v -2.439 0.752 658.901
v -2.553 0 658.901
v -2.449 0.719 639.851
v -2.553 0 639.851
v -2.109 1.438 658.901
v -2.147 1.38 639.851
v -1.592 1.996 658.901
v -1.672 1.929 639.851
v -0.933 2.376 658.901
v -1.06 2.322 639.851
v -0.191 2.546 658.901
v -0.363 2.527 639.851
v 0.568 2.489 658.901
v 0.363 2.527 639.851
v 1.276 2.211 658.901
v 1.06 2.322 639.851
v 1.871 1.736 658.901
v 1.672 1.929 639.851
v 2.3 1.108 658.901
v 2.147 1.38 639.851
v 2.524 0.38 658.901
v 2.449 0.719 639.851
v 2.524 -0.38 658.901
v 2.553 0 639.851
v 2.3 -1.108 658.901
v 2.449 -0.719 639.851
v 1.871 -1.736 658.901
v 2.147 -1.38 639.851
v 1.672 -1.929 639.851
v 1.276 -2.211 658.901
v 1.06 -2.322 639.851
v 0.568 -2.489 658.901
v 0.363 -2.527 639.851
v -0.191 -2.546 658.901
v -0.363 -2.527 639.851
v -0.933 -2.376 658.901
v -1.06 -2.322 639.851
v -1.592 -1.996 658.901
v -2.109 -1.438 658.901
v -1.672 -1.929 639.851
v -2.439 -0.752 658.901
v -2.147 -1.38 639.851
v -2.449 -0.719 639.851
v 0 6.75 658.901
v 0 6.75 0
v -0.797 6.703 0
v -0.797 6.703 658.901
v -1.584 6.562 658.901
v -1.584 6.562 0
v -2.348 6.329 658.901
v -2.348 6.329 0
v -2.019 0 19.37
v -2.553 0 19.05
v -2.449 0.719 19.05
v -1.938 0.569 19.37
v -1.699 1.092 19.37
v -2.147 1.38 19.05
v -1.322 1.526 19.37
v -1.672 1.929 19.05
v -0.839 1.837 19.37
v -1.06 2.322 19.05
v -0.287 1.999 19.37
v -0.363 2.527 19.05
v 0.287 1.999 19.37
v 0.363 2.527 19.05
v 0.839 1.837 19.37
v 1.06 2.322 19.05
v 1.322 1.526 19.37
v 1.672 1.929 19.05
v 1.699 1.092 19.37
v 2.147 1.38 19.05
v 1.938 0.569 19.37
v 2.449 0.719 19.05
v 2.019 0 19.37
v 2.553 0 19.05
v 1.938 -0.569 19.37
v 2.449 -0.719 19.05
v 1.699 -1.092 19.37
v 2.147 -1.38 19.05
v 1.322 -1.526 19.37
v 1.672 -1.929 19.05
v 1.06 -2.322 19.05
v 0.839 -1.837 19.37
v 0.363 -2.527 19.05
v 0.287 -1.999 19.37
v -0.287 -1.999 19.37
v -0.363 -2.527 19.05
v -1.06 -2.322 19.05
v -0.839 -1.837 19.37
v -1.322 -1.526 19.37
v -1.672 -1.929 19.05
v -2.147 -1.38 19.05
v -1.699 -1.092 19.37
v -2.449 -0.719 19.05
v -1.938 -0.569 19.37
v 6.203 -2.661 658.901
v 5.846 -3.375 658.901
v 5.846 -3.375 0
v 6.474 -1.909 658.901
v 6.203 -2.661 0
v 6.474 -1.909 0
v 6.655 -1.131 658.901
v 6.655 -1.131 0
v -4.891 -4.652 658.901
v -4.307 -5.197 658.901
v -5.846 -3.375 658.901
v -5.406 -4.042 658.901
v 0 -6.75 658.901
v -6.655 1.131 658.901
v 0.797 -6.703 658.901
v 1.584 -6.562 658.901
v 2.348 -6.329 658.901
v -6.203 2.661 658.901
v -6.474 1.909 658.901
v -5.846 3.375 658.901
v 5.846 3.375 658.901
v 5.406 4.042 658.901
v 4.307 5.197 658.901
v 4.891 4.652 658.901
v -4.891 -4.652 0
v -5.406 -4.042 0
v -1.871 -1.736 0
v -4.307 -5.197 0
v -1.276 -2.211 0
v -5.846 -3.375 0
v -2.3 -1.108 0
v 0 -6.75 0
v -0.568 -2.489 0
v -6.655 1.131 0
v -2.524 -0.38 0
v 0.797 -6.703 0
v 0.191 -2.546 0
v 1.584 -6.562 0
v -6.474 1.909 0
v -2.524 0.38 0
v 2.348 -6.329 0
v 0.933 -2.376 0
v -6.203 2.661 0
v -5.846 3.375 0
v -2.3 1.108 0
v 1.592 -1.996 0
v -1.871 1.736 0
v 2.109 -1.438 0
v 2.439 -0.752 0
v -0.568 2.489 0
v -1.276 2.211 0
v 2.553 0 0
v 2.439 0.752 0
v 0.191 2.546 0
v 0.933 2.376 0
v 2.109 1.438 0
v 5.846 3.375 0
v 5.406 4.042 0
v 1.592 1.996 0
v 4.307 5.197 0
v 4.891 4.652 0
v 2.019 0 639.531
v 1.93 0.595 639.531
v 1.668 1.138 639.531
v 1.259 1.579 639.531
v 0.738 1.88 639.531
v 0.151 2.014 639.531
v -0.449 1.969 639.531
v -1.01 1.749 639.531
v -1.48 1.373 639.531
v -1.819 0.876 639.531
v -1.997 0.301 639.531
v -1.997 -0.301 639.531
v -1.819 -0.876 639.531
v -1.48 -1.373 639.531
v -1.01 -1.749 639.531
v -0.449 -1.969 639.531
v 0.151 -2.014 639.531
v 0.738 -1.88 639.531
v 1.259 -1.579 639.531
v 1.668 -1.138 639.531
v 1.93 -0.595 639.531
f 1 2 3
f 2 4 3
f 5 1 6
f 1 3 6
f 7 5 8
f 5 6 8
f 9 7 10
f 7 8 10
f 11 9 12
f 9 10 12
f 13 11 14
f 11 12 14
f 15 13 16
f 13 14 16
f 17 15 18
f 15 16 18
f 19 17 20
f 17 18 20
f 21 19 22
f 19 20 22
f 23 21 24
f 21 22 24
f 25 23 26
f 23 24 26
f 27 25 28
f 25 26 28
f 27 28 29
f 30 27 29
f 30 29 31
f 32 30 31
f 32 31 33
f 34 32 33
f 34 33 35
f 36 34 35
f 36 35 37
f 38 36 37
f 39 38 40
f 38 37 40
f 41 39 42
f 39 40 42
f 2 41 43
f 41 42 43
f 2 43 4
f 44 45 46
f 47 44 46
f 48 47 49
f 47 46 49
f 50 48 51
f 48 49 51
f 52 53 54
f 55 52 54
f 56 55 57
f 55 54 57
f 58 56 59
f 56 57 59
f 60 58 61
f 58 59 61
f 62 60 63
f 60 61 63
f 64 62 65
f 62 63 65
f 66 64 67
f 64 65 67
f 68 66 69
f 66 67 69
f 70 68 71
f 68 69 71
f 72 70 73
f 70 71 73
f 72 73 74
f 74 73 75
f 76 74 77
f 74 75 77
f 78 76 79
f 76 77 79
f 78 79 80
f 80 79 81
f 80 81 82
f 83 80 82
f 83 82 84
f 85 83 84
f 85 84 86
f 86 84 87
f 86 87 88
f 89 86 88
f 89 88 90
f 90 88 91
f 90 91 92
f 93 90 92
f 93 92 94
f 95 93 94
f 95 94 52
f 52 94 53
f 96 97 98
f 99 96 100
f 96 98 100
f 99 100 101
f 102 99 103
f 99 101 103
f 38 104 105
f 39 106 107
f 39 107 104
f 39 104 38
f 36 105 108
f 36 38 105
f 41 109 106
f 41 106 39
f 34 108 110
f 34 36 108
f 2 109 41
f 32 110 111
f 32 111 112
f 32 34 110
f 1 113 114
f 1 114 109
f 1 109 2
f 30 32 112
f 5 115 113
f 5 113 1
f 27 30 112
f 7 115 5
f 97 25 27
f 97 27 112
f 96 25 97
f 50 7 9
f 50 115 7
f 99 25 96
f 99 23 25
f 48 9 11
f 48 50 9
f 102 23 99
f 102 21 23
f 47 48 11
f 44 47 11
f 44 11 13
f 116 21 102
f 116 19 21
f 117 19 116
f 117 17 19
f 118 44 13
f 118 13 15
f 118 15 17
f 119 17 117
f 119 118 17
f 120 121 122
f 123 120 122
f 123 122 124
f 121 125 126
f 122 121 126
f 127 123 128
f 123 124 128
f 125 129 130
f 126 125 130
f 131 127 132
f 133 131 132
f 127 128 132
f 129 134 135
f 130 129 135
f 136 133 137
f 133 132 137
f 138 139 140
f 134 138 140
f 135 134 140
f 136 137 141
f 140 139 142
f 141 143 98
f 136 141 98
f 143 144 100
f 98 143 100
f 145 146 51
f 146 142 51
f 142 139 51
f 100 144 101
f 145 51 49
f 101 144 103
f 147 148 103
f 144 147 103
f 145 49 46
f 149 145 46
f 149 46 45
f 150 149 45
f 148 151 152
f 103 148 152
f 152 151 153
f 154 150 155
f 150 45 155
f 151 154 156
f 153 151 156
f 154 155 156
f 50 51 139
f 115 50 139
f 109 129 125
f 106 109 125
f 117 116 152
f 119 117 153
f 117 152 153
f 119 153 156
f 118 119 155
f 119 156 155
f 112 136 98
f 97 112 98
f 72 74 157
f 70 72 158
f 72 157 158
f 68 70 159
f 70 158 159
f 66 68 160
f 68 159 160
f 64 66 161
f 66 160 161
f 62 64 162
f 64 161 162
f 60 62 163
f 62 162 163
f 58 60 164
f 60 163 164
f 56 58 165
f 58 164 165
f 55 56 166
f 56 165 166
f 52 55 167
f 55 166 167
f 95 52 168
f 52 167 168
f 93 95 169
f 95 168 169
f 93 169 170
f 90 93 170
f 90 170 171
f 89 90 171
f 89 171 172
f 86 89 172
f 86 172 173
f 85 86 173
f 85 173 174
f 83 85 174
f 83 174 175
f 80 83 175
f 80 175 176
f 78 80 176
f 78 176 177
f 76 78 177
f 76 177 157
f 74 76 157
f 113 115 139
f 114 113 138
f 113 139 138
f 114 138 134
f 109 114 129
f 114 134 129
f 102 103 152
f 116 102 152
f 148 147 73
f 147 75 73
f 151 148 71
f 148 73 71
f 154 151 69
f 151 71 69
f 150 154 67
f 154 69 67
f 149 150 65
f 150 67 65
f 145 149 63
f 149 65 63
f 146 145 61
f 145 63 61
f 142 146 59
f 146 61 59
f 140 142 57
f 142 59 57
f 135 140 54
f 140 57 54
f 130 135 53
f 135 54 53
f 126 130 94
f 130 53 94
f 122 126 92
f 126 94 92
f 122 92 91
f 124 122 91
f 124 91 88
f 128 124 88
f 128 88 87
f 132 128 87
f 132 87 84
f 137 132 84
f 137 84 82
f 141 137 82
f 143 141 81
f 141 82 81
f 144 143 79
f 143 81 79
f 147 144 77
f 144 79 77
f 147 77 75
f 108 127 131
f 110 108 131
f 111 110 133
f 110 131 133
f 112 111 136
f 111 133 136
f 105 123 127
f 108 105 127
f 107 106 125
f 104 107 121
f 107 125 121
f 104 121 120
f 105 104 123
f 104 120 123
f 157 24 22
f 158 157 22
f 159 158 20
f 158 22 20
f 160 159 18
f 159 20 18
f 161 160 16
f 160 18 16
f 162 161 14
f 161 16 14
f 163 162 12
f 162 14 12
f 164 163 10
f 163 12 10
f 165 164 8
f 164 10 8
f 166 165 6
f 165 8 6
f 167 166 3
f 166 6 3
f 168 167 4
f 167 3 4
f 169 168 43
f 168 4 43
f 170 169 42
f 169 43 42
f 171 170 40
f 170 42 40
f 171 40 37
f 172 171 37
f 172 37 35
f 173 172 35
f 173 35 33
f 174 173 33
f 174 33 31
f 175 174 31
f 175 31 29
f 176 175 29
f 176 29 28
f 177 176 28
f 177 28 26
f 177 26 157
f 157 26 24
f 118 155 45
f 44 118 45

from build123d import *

# Parameters (mm, degrees)
BOSS_EXTRUDE1_DEPTH         = 658.9014
SKETCH2_R                   = 2.0193
CUT_EXTRUDE1_DEPTH          = 659.969574666
F_1_4_20_TAPPED_HOLE1_D     = 5.1054
F_1_4_20_TAPPED_HOLE1_DEPTH = 19.05
F_1_4_20_TAPPED_HOLE1_TIP   = 1.533816902
F_1_4_20_TAPPED_HOLE2_D     = 5.1054
F_1_4_20_TAPPED_HOLE2_DEPTH = 19.05
F_1_4_20_TAPPED_HOLE2_TIP   = 1.533816902


with BuildPart() as part:
    # Sketch1 → Boss-Extrude1 (new body)
    with BuildSketch(Plane.XY):
        with BuildLine():
            Line((-6.654540832, 1.131188008), (-5.845671476, -3.375))
            ThreePointArc((-5.845671476, -3.375), (-5.15742276, -4.354709), (-4.306907968, -5.197407407))
            Line((-4.306907968, -5.197407407), (0, -6.75))
            ThreePointArc((0, -6.75), (1.19257724, -6.643813628), (2.347632865, -6.328595415))
            Line((2.347632865, -6.328595415), (5.845671476, -3.375))
            ThreePointArc((5.845671476, -3.375), (6.35, -2.289104628), (6.654540832, -1.131188008))
            Line((6.654540832, -1.131188008), (5.845671476, 3.375))
            ThreePointArc((5.845671476, 3.375), (5.15742276, 4.354709), (4.306907968, 5.197407407))
            Line((4.306907968, 5.197407407), (0, 6.75))
            ThreePointArc((0, 6.75), (-1.19257724, 6.643813628), (-2.347632865, 6.328595415))
            Line((-2.347632865, 6.328595415), (-5.845671476, 3.375))
            ThreePointArc((-5.845671476, 3.375), (-6.35, 2.289104628), (-6.654540832, 1.131188008))
        make_face()
    extrude(amount=BOSS_EXTRUDE1_DEPTH)

    # Sketch2 → Cut-Extrude1 (cut, through all)
    with BuildSketch(Plane.XY.offset(658.9014)):
        Circle(SKETCH2_R)
    extrude(amount=-CUT_EXTRUDE1_DEPTH, mode=Mode.SUBTRACT)

    # 1/4-20 Tapped Hole1
    with Locations(Plane.XY.offset(658.9014)):
        with Locations((0, 0)):
            Hole(F_1_4_20_TAPPED_HOLE1_D / 2, depth=F_1_4_20_TAPPED_HOLE1_DEPTH)
            with Locations((0, 0, -(F_1_4_20_TAPPED_HOLE1_DEPTH + F_1_4_20_TAPPED_HOLE1_TIP / 2))):  # 118° drill point
                Cone(0, F_1_4_20_TAPPED_HOLE1_D / 2, F_1_4_20_TAPPED_HOLE1_TIP, mode=Mode.SUBTRACT)

    # 1/4-20 Tapped Hole2
    with Locations(Plane(origin=(0, 0, 0), x_dir=(-1, 0, 0), z_dir=(0, 0, -1))):
        with Locations((0, 0)):
            Hole(F_1_4_20_TAPPED_HOLE2_D / 2, depth=F_1_4_20_TAPPED_HOLE2_DEPTH)
            with Locations((0, 0, -(F_1_4_20_TAPPED_HOLE2_DEPTH + F_1_4_20_TAPPED_HOLE2_TIP / 2))):  # 118° drill point
                Cone(0, F_1_4_20_TAPPED_HOLE2_D / 2, F_1_4_20_TAPPED_HOLE2_TIP, mode=Mode.SUBTRACT)


solid = part.part
